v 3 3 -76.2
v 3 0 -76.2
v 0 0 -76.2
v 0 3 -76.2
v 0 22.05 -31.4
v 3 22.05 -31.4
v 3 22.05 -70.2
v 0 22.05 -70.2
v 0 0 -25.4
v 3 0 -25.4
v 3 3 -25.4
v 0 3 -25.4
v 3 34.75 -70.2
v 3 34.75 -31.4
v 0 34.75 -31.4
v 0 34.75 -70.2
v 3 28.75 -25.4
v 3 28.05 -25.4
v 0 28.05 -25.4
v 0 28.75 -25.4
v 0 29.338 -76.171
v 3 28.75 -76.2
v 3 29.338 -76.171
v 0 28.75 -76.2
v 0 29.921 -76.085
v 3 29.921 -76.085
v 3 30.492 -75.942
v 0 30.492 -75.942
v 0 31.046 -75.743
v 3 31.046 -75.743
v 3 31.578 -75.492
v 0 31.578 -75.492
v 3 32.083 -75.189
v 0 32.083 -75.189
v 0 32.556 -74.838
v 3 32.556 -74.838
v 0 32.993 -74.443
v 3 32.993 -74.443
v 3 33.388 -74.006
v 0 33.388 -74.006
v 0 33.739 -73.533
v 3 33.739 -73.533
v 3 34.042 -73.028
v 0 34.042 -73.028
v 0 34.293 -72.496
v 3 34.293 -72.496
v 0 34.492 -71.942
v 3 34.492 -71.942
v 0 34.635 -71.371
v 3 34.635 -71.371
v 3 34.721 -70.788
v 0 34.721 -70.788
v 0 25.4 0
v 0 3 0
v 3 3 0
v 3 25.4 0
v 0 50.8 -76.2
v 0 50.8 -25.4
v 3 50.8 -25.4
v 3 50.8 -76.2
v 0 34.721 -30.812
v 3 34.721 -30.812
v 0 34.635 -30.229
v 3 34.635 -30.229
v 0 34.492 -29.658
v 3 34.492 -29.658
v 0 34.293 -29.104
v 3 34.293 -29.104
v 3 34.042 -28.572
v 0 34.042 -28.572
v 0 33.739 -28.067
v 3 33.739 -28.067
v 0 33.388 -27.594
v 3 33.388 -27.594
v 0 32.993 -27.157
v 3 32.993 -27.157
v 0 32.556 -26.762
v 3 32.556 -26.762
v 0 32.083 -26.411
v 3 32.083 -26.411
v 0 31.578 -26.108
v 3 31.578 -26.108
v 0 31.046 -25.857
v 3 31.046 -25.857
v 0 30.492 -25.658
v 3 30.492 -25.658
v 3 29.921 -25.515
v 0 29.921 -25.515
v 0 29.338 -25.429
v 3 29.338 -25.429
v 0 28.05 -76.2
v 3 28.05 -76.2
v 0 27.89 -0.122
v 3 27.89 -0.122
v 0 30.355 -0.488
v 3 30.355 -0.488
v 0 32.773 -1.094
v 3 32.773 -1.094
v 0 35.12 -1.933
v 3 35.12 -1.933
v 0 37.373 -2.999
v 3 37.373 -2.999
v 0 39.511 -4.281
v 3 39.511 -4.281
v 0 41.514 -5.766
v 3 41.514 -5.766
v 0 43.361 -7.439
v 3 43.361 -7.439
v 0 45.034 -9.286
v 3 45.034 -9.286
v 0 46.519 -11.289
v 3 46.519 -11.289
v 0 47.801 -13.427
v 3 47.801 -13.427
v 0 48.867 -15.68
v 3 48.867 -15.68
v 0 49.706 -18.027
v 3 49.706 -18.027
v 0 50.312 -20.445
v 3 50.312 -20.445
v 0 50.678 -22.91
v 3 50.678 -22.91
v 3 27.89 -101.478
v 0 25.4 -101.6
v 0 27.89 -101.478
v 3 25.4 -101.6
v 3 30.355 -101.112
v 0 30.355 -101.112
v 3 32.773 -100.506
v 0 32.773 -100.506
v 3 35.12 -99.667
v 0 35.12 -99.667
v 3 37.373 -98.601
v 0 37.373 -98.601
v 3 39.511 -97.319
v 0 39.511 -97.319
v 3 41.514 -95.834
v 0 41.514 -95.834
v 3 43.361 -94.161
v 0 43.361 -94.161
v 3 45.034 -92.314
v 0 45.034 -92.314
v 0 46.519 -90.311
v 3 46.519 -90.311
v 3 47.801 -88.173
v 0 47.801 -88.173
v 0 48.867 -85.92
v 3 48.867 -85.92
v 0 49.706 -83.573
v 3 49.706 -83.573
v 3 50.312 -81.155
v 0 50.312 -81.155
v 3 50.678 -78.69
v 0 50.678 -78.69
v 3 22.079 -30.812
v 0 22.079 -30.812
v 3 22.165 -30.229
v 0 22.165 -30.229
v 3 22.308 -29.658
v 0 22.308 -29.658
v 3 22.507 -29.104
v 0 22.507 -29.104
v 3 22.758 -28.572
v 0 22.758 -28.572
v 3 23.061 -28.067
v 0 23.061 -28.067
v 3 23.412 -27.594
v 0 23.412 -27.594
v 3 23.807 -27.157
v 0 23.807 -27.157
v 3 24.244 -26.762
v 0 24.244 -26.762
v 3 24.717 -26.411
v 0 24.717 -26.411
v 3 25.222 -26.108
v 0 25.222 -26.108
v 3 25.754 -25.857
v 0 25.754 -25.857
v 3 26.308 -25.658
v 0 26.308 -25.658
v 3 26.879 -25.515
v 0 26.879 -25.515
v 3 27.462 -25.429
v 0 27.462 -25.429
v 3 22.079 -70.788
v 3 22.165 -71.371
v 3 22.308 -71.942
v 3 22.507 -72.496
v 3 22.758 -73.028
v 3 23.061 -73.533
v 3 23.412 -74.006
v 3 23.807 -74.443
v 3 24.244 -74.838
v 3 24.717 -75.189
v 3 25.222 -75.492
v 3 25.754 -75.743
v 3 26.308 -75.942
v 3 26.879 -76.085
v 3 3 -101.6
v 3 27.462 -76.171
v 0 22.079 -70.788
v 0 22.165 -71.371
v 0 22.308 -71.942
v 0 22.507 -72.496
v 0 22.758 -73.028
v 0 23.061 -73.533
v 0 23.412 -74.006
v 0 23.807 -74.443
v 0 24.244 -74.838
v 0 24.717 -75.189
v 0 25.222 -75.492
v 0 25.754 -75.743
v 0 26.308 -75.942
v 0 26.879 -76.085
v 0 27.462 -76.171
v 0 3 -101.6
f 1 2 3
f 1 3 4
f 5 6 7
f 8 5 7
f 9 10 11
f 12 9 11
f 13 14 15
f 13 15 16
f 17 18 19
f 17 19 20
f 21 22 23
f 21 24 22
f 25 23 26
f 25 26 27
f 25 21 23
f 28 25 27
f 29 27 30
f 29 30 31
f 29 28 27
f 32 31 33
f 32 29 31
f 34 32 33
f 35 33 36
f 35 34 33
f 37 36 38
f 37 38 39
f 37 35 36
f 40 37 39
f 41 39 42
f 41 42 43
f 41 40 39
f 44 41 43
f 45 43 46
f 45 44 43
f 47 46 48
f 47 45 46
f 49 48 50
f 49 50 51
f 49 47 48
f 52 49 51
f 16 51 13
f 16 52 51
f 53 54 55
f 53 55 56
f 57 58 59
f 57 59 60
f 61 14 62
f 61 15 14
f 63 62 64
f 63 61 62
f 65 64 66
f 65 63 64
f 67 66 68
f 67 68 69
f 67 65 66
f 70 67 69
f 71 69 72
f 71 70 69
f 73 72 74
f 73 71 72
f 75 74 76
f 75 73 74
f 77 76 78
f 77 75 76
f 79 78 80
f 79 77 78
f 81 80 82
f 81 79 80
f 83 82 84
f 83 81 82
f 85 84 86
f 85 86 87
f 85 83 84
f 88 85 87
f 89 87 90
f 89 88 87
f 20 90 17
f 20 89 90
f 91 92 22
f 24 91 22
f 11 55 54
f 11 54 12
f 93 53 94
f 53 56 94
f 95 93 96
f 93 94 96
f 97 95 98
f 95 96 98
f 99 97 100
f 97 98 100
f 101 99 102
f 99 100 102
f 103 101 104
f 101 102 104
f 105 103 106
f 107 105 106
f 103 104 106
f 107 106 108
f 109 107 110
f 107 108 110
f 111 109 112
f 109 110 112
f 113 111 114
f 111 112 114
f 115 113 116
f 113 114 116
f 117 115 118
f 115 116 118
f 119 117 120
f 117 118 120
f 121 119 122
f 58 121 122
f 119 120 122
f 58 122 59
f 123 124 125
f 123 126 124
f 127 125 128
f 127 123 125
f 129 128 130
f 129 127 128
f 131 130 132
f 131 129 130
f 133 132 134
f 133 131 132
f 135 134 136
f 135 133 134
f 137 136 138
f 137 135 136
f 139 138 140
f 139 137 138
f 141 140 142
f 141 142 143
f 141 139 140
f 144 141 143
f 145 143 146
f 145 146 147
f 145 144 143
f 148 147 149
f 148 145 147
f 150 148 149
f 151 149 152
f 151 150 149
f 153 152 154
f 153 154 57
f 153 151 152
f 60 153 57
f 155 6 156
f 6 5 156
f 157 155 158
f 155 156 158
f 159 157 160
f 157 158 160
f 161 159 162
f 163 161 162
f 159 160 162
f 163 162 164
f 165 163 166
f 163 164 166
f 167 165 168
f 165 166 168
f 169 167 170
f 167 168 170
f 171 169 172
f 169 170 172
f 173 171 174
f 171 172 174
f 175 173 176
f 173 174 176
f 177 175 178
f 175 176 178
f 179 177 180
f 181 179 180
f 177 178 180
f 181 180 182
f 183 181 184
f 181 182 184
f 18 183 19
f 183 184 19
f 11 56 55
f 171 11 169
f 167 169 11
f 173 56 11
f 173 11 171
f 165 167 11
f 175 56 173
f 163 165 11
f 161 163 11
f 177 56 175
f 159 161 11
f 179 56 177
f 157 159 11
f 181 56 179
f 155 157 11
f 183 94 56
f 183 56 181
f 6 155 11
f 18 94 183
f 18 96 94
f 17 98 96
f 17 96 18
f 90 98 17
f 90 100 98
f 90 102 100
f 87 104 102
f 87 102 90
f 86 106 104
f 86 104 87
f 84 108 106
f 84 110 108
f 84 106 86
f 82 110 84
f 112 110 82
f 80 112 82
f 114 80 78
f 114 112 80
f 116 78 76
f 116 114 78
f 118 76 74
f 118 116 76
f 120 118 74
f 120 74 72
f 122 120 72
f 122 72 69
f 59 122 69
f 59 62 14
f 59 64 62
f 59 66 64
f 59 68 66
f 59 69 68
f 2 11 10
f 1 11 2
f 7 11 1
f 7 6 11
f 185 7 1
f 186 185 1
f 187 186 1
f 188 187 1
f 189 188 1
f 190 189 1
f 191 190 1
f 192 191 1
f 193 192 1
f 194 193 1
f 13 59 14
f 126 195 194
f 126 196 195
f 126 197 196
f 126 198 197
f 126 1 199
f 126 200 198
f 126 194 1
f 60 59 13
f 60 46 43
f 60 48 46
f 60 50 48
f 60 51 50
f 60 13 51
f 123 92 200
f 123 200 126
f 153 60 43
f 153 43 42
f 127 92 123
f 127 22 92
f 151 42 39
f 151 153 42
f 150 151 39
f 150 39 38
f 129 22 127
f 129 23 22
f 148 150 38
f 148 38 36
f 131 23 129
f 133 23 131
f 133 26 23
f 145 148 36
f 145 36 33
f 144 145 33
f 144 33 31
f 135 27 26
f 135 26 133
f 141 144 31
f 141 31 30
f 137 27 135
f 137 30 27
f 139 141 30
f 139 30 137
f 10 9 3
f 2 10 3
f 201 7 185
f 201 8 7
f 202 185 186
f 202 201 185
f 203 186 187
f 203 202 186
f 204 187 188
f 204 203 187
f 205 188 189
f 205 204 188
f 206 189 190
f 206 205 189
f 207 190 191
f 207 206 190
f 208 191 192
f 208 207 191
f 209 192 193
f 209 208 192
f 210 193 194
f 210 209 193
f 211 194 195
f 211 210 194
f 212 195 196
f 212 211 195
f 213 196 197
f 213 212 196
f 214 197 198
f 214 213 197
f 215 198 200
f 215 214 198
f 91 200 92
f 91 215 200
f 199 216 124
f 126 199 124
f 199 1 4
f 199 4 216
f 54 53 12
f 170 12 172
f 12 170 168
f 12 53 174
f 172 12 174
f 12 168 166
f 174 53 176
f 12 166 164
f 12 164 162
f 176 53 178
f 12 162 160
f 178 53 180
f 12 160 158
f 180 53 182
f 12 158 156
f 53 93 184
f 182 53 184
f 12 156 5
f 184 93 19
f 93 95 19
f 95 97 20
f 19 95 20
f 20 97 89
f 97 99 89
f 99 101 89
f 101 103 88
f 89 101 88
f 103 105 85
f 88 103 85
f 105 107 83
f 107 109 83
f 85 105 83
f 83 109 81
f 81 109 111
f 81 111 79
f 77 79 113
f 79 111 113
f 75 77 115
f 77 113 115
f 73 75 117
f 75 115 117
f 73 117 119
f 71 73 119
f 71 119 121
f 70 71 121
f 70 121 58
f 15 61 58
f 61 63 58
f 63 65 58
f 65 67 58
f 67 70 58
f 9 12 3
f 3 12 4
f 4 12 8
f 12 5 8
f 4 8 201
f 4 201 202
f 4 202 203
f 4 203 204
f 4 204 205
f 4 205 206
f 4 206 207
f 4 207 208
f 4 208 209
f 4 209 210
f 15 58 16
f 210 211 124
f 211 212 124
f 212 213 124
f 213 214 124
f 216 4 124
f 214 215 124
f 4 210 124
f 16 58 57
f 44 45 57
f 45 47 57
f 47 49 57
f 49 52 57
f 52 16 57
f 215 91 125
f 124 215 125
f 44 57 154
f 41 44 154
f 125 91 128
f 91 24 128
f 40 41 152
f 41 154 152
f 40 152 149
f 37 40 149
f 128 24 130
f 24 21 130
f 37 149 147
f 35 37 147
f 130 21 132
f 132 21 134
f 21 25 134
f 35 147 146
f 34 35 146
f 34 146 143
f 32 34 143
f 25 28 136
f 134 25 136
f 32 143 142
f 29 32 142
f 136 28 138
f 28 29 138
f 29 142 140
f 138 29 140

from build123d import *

# Parameters (mm, degrees)
SKETCH2_W           = 101.6
SKETCH2_H           = 50.8
BOSS_EXTRUDE1_DEPTH = 3
FILLET1_R           = 25.4
SKETCH4_W           = 25.4
SKETCH4_H           = 3
CUT_EXTRUDE1_DEPTH  = 3
SKETCH6_W           = 50.8
SKETCH6_H           = 12.7
CUT_EXTRUDE2_DEPTH  = 10
FILLET2_R           = 6


with BuildPart() as part:
    # Sketch2 → Boss-Extrude1 (new body)
    with BuildSketch(Plane(origin=(0, 0, 0), x_dir=(0, 0, -1), z_dir=(1, 0, 0))):
        with Locations((50.8, 25.4)):
            Rectangle(SKETCH2_W, SKETCH2_H)
    extrude(amount=BOSS_EXTRUDE1_DEPTH)

    # Fillet1
    fillet1_edges = [part.edges().sort_by_distance(p)[0] for p in [
        (1.5, 50.8, 0),
        (1.5, 50.8, -101.6),
    ]]
    fillet(fillet1_edges, radius=FILLET1_R)

    # Sketch4 → Cut-Extrude1 (cut)
    with BuildSketch(Plane(origin=(3, 0, 0), x_dir=(0, 0, -1), z_dir=(1, 0, 0))):
        with Locations((12.7, 1.5)):
            Rectangle(SKETCH4_W, SKETCH4_H)
        with Locations((88.9, 1.5)):
            Rectangle(SKETCH4_W, SKETCH4_H)
    extrude(amount=-CUT_EXTRUDE1_DEPTH, mode=Mode.SUBTRACT)

    # Sketch6 → Cut-Extrude2 (cut)
    with BuildSketch(Plane(origin=(3, 0, 0), x_dir=(0, 0, -1), z_dir=(1, 0, 0))):
        with Locations((50.8, 28.4)):
            Rectangle(SKETCH6_W, SKETCH6_H)
    extrude(amount=-CUT_EXTRUDE2_DEPTH, mode=Mode.SUBTRACT)

    # Fillet2
    fillet2_edges = [part.edges().sort_by_distance(p)[0] for p in [
        (1.5, 22.05, -25.4),
        (1.5, 34.75, -25.4),
        (1.5, 34.75, -76.2),
        (1.5, 22.05, -76.2),
    ]]
    fillet(fillet2_edges, radius=FILLET2_R)


solid = part.part
